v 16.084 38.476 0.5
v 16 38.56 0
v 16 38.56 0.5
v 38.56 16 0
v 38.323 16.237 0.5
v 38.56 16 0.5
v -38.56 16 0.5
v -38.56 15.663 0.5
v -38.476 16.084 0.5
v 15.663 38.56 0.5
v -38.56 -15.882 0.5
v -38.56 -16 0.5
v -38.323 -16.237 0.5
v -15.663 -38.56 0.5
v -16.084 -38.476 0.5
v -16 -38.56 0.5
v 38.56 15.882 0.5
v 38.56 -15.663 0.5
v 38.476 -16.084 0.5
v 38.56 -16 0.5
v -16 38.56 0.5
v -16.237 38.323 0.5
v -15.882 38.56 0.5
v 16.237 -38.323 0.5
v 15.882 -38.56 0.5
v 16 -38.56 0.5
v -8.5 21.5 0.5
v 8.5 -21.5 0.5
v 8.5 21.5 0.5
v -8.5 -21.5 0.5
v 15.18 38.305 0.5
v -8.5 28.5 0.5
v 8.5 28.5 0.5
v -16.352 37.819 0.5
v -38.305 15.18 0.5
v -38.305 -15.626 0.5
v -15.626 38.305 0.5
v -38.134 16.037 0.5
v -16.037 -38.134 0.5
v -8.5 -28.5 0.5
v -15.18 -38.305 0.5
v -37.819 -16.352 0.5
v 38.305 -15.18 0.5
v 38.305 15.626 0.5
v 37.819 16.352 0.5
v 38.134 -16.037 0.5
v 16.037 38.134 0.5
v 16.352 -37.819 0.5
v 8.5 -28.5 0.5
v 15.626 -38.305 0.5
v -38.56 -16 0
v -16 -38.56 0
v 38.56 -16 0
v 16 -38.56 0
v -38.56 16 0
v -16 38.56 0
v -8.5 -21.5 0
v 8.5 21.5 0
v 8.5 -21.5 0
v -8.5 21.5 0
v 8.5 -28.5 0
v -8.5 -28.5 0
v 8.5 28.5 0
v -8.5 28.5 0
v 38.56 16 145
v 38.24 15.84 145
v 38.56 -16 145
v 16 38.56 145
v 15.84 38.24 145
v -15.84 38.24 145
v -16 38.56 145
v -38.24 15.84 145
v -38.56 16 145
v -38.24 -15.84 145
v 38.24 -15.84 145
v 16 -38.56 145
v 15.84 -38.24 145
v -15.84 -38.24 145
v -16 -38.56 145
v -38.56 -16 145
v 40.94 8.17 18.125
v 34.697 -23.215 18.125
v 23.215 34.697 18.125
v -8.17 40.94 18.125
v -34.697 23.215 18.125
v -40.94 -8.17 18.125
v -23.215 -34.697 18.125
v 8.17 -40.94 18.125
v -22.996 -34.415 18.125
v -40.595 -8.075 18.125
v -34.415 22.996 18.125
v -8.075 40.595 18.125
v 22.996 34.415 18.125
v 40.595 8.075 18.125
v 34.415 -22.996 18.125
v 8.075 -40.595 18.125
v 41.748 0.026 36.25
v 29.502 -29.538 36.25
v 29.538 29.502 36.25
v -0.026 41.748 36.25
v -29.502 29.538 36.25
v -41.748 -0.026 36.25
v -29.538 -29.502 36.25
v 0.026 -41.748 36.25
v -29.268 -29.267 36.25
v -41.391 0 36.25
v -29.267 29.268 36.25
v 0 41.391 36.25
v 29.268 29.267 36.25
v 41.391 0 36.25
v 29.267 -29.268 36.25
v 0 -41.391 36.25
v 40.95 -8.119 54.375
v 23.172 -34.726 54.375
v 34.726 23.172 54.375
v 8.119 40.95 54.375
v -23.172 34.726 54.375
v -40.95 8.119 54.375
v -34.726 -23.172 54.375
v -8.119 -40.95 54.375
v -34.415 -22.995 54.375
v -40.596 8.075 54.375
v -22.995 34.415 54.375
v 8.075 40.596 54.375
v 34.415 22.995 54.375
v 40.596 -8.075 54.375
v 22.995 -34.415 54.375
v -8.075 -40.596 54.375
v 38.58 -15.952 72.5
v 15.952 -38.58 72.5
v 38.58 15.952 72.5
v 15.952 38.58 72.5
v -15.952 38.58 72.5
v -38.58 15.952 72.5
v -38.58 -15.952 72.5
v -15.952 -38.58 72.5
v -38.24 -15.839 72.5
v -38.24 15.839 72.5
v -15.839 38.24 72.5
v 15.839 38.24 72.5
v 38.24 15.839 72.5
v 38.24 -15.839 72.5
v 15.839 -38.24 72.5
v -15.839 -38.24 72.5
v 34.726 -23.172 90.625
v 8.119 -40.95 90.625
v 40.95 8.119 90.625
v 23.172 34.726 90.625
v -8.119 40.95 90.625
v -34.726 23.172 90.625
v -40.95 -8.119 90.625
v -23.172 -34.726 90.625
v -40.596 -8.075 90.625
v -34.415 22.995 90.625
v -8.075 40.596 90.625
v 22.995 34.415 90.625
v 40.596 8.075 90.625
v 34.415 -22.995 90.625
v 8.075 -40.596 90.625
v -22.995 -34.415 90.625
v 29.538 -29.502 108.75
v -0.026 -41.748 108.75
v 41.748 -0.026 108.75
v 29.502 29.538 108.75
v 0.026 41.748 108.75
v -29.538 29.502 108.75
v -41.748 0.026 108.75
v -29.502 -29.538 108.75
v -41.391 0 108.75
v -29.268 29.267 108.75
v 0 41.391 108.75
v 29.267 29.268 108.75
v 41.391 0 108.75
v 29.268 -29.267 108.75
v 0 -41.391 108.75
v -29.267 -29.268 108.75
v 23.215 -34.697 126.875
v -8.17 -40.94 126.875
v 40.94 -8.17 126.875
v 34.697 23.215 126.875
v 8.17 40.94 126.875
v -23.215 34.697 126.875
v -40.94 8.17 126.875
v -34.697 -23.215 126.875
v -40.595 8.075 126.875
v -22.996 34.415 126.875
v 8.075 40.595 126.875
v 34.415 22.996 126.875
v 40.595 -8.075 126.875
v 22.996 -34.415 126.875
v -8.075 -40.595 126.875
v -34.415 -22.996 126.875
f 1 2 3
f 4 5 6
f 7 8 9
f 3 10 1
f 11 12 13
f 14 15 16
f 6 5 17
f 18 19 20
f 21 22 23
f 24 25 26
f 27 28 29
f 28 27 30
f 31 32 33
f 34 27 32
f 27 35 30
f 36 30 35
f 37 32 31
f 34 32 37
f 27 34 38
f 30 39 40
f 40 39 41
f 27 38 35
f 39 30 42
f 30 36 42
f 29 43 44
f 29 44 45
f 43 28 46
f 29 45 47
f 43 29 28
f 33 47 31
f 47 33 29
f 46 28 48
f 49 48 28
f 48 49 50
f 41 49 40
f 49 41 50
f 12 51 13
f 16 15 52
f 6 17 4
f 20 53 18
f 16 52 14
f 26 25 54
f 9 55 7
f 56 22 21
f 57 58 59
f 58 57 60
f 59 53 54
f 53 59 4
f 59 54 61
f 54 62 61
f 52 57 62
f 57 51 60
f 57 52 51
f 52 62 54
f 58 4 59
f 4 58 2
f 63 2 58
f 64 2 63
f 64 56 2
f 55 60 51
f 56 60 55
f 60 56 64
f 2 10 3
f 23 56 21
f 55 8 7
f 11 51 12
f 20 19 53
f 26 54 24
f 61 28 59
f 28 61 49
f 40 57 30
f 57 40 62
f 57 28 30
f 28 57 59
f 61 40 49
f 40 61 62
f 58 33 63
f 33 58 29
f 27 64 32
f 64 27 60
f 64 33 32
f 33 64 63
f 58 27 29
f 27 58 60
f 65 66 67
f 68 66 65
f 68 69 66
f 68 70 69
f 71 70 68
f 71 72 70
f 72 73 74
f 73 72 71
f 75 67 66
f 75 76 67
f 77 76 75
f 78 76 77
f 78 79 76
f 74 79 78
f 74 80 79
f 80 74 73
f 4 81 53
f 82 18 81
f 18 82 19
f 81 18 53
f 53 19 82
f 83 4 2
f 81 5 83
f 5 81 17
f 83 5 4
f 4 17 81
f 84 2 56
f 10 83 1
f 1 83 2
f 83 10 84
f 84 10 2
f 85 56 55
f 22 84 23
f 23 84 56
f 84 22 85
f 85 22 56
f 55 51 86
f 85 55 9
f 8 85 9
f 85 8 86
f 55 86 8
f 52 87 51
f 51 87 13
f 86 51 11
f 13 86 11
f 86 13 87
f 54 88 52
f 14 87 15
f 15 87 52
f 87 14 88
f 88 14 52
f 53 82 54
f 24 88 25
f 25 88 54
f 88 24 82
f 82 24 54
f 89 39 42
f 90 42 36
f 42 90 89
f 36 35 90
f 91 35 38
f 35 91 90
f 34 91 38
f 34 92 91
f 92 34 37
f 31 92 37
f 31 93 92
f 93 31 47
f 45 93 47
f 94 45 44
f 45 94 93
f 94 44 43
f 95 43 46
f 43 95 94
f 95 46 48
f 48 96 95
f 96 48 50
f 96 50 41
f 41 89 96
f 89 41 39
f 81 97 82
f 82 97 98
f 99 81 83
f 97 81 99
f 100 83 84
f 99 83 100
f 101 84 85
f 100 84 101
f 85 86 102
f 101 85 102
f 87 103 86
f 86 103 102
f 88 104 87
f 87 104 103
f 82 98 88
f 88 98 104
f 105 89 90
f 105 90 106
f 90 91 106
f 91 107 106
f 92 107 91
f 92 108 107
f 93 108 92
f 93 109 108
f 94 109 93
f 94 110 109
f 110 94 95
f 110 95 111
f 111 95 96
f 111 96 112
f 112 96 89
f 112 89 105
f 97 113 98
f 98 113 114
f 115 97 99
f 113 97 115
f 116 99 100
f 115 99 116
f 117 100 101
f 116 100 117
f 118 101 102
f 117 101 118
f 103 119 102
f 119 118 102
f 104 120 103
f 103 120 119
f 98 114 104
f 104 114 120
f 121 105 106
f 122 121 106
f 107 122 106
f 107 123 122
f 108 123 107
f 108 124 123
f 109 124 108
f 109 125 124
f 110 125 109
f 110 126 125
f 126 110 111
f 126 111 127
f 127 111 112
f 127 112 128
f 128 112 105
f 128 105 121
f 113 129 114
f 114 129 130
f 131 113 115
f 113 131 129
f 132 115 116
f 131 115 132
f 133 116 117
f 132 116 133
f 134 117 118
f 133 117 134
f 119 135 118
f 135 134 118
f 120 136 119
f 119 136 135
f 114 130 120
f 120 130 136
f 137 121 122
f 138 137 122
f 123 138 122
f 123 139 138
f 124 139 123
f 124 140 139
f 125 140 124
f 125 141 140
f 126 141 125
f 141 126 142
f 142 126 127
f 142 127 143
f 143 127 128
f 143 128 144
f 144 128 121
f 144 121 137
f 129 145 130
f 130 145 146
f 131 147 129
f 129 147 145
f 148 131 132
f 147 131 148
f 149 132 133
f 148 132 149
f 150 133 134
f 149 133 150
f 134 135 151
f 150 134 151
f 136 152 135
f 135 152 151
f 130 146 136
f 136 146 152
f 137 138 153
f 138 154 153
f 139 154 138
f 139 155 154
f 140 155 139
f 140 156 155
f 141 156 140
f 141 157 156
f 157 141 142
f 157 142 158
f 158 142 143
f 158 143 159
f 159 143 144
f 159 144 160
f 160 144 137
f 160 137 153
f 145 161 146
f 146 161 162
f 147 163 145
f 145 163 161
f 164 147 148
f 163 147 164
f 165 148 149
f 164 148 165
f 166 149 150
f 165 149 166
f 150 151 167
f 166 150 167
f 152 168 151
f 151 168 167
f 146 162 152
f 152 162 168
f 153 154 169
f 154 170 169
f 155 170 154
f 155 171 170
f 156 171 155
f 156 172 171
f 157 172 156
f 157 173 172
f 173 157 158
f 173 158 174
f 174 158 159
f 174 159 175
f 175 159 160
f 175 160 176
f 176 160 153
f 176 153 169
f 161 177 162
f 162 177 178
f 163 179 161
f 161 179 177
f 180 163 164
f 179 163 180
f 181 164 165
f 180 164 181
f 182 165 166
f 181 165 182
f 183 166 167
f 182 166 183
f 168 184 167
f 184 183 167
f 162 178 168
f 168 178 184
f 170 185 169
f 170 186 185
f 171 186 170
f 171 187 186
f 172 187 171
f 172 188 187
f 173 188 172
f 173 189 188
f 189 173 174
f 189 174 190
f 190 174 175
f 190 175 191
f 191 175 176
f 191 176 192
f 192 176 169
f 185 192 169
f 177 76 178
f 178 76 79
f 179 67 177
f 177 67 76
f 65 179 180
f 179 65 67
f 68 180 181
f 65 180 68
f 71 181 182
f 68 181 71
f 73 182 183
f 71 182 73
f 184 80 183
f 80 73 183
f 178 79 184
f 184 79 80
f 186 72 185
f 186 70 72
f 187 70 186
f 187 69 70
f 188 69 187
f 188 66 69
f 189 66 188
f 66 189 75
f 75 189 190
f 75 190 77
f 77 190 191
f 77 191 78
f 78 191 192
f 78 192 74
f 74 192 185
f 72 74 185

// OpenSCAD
//
// An attempt at making something that sorta kinda resembles a square
// Japanese paper lantern.. eh.
//
module octagon() {
    polygon(points=[[1,2.41], [-1,2.41], [-2.41,1], [-2.41,-1], [-1,-2.41],
                    [1,-2.41], [2.41,-1], [2.41,1], [0.99,2.39], [-0.99,2.39],
                    [-2.39,0.99], [-2.39,-0.99], [-0.99,-2.39], [0.99,-2.39],
                    [2.39,-0.99], [2.39,0.99]],
                    paths=[[0,1,2,3,4,5,6,7],[8,9,10,11,12,13,14,15]]);
}
module solid_octagon() {
    polygon(points=[[1,2.41], [-1,2.41], [-2.41,1], [-2.41,-1], [-1,-2.41],
                    [1,-2.41], [2.41,-1], [2.41,1]],
                    paths=[[0,1,2,3,4,5,6,7]]);
}


module lantern() {
    // The top of the lantern, with two holes cut out for the six pin connectors
    // to be fed into
    union() {
    difference() {
        linear_extrude(height = 0.5, center = false, convexity = 10, twist = 0) {
            // scale(v=[28,28,1]) {
            //     solid_octagon();
            // }
            scale(v=[16,16,1]) {
                solid_octagon();
            }
        }
        translate([0, -25, 0]) {
            cube([17,7,5], center = true);
        }
        translate([0, 25, 0]) {
            cube([17,7,5], center = true);
        }
    }

    // difference() {
        // height = 100
        linear_extrude(height = 145, center = false, convexity = 10,
                       twist = 90) {
            // properly full sized octagon for our lamp shades
            // scale(v=[28,28,1]) {
            //     octagon();
            // }
            // Sized for Carolyn's LED lamp test
            //
            scale(v=[16,16,1]) {
                octagon();
            }
        }
        // Truncate the lantern for quicker test prints..
        //
        // translate([0, 0, 70]) {
        // cube([110,110,100], center = true);
        // }
        // }
    }
}

//octagon(80,100);
lantern();
